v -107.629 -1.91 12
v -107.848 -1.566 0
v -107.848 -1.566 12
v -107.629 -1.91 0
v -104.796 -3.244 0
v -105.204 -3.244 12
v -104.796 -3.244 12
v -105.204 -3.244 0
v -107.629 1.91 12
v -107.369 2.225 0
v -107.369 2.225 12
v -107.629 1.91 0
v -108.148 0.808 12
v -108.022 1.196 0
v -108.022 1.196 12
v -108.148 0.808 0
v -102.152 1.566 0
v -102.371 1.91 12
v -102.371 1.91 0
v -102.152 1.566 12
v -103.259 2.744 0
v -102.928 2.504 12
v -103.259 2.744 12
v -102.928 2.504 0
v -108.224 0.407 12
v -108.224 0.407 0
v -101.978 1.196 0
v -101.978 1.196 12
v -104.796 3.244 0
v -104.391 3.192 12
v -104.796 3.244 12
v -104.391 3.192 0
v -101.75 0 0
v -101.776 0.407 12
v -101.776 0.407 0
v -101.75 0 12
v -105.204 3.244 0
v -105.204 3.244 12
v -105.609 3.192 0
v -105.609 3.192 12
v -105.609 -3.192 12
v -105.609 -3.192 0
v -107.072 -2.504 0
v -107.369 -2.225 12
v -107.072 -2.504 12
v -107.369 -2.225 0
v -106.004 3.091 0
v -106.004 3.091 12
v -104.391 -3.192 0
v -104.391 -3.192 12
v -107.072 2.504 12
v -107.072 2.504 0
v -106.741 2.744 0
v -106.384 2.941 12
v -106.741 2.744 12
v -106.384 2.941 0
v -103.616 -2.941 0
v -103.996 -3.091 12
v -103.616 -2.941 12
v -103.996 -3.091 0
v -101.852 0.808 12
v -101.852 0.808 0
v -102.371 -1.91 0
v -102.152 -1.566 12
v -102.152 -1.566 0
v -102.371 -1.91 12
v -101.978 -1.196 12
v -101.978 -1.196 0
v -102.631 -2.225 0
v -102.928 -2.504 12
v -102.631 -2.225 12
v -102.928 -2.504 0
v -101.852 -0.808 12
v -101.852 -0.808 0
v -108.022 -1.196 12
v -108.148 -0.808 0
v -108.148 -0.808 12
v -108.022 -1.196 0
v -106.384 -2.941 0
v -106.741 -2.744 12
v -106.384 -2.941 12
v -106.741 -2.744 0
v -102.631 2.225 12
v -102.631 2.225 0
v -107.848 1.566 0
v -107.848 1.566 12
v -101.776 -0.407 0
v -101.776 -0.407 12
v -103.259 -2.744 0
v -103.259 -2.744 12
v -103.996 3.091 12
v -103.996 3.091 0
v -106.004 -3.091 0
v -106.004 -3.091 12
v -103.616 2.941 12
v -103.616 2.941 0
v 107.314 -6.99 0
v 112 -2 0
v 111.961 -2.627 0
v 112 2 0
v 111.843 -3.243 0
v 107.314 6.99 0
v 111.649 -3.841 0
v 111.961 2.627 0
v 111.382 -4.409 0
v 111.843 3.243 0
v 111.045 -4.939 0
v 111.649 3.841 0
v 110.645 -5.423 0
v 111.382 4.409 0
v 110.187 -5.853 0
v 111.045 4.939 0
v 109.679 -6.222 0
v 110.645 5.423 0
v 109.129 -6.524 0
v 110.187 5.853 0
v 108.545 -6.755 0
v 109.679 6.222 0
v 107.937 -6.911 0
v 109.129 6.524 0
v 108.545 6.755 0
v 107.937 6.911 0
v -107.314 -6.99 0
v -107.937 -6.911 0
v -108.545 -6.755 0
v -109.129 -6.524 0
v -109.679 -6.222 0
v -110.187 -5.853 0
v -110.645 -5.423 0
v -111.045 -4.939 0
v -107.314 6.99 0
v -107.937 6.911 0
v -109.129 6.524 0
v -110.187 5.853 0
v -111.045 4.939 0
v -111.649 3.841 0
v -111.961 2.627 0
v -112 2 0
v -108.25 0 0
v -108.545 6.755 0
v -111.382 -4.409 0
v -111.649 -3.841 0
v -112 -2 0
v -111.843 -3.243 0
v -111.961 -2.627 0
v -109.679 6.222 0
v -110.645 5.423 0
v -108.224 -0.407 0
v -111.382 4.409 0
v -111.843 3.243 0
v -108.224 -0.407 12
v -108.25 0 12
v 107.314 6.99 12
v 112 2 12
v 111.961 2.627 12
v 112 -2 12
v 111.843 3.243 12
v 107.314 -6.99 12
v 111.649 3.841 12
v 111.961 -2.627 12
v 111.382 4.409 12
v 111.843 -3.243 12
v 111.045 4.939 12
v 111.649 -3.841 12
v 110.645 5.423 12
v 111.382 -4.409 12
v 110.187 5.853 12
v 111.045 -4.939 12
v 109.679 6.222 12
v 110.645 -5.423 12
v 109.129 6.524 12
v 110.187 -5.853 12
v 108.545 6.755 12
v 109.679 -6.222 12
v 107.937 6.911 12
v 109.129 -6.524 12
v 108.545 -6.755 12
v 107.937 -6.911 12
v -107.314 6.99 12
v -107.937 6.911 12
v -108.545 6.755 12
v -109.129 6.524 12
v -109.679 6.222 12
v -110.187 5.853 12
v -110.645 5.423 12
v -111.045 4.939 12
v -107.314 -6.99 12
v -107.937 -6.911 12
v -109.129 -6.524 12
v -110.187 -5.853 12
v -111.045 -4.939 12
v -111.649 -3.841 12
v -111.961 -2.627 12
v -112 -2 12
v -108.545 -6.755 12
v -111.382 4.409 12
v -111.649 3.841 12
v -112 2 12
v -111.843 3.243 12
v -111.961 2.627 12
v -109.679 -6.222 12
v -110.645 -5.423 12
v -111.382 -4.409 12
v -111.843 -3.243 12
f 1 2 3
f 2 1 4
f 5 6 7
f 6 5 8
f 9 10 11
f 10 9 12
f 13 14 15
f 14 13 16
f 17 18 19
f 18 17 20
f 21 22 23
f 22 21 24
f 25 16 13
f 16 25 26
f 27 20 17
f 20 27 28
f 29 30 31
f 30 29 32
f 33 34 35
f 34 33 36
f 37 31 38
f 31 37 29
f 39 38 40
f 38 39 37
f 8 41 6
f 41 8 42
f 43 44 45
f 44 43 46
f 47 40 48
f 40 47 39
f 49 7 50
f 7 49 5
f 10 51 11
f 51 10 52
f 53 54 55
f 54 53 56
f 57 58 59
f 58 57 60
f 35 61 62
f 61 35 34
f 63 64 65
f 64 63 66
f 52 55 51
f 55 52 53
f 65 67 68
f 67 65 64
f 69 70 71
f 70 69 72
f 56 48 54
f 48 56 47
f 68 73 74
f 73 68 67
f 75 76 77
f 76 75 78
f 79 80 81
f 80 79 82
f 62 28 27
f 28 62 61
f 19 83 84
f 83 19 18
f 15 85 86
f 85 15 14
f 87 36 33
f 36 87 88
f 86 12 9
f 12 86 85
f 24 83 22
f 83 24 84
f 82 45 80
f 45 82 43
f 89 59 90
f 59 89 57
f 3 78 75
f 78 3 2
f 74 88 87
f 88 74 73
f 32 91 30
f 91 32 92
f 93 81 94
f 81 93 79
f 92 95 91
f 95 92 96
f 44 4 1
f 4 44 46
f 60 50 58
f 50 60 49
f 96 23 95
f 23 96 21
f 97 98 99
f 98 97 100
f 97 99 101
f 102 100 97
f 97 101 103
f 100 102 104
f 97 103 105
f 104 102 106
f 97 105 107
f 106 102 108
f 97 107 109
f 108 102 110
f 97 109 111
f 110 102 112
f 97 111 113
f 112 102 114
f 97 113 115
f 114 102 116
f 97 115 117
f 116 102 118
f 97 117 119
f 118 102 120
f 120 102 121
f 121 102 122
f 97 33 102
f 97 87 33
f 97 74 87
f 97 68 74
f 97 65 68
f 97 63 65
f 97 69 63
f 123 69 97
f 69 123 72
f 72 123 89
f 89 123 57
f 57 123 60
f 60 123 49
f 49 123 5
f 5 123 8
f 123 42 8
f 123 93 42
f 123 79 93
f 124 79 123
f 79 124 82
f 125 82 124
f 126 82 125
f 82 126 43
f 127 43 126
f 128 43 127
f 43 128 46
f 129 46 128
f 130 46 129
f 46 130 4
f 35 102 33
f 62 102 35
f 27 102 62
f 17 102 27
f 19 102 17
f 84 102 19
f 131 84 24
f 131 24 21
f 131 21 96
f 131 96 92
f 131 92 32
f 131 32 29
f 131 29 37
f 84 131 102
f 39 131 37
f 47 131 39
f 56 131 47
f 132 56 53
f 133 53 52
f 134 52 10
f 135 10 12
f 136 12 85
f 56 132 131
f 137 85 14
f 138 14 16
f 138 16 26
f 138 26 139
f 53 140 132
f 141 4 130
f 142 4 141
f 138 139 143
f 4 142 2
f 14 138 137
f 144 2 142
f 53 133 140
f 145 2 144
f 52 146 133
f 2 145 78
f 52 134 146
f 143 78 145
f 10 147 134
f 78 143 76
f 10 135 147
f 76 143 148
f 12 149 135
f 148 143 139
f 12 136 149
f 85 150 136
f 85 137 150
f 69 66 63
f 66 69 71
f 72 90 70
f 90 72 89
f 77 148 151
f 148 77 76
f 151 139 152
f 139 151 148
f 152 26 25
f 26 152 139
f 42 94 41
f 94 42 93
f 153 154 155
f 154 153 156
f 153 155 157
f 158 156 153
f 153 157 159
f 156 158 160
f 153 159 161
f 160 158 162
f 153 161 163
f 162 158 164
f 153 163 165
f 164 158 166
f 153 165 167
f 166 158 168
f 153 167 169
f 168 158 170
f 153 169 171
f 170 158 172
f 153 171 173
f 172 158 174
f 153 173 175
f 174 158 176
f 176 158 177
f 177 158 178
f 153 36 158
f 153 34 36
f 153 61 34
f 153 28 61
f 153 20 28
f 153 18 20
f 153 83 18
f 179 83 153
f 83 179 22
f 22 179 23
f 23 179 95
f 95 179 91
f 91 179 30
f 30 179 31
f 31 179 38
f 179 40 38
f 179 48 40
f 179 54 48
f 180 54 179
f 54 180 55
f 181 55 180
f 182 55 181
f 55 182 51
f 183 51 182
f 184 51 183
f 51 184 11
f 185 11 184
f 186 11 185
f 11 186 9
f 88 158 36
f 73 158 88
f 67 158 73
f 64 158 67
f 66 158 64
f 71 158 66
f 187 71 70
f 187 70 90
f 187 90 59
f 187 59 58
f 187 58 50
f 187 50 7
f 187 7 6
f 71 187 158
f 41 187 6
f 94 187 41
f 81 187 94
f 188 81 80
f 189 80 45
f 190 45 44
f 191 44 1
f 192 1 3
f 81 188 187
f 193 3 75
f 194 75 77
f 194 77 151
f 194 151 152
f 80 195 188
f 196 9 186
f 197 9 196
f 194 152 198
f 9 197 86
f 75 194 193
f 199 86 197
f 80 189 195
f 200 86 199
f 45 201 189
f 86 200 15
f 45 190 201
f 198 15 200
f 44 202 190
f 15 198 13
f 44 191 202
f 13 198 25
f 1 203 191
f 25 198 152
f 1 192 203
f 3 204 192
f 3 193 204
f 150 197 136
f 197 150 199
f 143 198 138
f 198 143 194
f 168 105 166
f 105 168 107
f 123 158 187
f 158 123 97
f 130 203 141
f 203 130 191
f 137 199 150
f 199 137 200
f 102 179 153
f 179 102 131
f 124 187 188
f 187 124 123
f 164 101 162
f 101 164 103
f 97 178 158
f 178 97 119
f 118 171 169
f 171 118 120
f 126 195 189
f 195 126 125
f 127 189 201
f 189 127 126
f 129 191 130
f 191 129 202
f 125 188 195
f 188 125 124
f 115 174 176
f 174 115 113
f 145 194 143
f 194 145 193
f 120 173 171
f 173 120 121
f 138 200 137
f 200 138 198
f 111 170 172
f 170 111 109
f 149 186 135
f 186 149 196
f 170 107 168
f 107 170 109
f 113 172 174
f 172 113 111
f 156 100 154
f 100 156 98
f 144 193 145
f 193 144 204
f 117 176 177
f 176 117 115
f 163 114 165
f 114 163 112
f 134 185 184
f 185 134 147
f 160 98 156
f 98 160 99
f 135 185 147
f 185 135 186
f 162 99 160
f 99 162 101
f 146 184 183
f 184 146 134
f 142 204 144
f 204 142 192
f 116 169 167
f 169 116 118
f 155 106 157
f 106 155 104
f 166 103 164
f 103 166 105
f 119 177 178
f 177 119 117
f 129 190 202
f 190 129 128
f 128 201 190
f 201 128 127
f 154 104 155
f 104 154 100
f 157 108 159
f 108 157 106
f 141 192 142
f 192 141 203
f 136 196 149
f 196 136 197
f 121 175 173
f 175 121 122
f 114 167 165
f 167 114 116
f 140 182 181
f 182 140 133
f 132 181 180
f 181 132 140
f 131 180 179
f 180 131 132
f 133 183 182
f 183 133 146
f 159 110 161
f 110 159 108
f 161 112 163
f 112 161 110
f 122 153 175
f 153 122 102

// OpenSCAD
$fn = 50;


difference() {
	union() {
		hull() {
			translate(v = [-107.0000000000, 2.0000000000, 0]) {
				cylinder(h = 12, r = 5);
			}
			translate(v = [107.0000000000, 2.0000000000, 0]) {
				cylinder(h = 12, r = 5);
			}
			translate(v = [-107.0000000000, -2.0000000000, 0]) {
				cylinder(h = 12, r = 5);
			}
			translate(v = [107.0000000000, -2.0000000000, 0]) {
				cylinder(h = 12, r = 5);
			}
		}
	}
	union() {
		translate(v = [-105.0000000000, 0.0000000000, 0]) {
			cylinder(h = 12, r = 3.2500000000);
		}
		translate(v = [-105.0000000000, 0.0000000000, 0]) {
			cylinder(h = 12, r = 1.8000000000);
		}
		translate(v = [-105.0000000000, 0.0000000000, 0]) {
			cylinder(h = 12, r = 1.8000000000);
		}
		translate(v = [-105.0000000000, 0.0000000000, 0]) {
			cylinder(h = 12, r = 1.8000000000);
		}
	}
}
